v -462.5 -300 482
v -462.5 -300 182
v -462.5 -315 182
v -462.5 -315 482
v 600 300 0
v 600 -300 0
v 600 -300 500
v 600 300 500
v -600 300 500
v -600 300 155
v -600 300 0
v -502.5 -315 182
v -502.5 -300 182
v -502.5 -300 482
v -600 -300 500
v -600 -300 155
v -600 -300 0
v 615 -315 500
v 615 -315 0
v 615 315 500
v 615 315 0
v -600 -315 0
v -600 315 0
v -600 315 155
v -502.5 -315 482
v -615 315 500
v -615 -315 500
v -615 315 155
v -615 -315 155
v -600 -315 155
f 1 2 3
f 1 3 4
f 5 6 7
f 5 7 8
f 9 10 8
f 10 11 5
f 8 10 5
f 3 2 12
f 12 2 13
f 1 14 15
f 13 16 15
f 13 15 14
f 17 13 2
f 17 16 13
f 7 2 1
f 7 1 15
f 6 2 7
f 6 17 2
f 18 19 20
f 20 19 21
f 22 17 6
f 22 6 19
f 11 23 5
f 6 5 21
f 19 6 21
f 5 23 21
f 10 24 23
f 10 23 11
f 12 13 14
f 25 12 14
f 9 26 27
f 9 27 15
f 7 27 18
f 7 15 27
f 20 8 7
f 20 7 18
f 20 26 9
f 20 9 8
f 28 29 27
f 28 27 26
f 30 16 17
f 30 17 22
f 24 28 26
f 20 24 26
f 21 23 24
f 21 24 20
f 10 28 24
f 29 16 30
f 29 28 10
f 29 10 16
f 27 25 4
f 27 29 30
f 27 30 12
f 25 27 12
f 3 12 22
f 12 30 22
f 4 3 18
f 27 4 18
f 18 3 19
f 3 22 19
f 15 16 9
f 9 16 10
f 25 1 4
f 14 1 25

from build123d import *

# Parameters (mm, degrees)
F0_W     = 1230
F0_H     = 630
F0_W_2   = 1200
F0_H_2   = 600
F1_DEPTH = 500
F2_W     = 40
F2_H     = 300
F3_DEPTH = 25
F4_W     = 630
F4_H     = 155
F5_DEPTH = 15


with BuildPart() as f1:
    # F0 (on Top) → F1 (new body)
    with BuildSketch(Plane.XY):
        Rectangle(F0_W, F0_H)
        Rectangle(F0_W_2, F0_H_2, mode=Mode.SUBTRACT)
    extrude(amount=F1_DEPTH)

    # F2 (on face) → F3 (cut)
    with BuildSketch(Plane(origin=(0, -300, 0), x_dir=(-1, 0, 0), z_dir=(0, 1, 0))):
        with Locations((482.5, 332)):
            Rectangle(F2_W, F2_H)
    extrude(amount=-F3_DEPTH, mode=Mode.SUBTRACT)

    # F4 (on face) → F5 (cut)
    with BuildSketch(Plane(origin=(-615, 0, 0), x_dir=(0, -1, 0), z_dir=(-1, 0, 0))):
        with Locations((0, 77.5)):
            Rectangle(F4_W, F4_H)
    extrude(amount=-F5_DEPTH, mode=Mode.SUBTRACT)


solid = f1.part
